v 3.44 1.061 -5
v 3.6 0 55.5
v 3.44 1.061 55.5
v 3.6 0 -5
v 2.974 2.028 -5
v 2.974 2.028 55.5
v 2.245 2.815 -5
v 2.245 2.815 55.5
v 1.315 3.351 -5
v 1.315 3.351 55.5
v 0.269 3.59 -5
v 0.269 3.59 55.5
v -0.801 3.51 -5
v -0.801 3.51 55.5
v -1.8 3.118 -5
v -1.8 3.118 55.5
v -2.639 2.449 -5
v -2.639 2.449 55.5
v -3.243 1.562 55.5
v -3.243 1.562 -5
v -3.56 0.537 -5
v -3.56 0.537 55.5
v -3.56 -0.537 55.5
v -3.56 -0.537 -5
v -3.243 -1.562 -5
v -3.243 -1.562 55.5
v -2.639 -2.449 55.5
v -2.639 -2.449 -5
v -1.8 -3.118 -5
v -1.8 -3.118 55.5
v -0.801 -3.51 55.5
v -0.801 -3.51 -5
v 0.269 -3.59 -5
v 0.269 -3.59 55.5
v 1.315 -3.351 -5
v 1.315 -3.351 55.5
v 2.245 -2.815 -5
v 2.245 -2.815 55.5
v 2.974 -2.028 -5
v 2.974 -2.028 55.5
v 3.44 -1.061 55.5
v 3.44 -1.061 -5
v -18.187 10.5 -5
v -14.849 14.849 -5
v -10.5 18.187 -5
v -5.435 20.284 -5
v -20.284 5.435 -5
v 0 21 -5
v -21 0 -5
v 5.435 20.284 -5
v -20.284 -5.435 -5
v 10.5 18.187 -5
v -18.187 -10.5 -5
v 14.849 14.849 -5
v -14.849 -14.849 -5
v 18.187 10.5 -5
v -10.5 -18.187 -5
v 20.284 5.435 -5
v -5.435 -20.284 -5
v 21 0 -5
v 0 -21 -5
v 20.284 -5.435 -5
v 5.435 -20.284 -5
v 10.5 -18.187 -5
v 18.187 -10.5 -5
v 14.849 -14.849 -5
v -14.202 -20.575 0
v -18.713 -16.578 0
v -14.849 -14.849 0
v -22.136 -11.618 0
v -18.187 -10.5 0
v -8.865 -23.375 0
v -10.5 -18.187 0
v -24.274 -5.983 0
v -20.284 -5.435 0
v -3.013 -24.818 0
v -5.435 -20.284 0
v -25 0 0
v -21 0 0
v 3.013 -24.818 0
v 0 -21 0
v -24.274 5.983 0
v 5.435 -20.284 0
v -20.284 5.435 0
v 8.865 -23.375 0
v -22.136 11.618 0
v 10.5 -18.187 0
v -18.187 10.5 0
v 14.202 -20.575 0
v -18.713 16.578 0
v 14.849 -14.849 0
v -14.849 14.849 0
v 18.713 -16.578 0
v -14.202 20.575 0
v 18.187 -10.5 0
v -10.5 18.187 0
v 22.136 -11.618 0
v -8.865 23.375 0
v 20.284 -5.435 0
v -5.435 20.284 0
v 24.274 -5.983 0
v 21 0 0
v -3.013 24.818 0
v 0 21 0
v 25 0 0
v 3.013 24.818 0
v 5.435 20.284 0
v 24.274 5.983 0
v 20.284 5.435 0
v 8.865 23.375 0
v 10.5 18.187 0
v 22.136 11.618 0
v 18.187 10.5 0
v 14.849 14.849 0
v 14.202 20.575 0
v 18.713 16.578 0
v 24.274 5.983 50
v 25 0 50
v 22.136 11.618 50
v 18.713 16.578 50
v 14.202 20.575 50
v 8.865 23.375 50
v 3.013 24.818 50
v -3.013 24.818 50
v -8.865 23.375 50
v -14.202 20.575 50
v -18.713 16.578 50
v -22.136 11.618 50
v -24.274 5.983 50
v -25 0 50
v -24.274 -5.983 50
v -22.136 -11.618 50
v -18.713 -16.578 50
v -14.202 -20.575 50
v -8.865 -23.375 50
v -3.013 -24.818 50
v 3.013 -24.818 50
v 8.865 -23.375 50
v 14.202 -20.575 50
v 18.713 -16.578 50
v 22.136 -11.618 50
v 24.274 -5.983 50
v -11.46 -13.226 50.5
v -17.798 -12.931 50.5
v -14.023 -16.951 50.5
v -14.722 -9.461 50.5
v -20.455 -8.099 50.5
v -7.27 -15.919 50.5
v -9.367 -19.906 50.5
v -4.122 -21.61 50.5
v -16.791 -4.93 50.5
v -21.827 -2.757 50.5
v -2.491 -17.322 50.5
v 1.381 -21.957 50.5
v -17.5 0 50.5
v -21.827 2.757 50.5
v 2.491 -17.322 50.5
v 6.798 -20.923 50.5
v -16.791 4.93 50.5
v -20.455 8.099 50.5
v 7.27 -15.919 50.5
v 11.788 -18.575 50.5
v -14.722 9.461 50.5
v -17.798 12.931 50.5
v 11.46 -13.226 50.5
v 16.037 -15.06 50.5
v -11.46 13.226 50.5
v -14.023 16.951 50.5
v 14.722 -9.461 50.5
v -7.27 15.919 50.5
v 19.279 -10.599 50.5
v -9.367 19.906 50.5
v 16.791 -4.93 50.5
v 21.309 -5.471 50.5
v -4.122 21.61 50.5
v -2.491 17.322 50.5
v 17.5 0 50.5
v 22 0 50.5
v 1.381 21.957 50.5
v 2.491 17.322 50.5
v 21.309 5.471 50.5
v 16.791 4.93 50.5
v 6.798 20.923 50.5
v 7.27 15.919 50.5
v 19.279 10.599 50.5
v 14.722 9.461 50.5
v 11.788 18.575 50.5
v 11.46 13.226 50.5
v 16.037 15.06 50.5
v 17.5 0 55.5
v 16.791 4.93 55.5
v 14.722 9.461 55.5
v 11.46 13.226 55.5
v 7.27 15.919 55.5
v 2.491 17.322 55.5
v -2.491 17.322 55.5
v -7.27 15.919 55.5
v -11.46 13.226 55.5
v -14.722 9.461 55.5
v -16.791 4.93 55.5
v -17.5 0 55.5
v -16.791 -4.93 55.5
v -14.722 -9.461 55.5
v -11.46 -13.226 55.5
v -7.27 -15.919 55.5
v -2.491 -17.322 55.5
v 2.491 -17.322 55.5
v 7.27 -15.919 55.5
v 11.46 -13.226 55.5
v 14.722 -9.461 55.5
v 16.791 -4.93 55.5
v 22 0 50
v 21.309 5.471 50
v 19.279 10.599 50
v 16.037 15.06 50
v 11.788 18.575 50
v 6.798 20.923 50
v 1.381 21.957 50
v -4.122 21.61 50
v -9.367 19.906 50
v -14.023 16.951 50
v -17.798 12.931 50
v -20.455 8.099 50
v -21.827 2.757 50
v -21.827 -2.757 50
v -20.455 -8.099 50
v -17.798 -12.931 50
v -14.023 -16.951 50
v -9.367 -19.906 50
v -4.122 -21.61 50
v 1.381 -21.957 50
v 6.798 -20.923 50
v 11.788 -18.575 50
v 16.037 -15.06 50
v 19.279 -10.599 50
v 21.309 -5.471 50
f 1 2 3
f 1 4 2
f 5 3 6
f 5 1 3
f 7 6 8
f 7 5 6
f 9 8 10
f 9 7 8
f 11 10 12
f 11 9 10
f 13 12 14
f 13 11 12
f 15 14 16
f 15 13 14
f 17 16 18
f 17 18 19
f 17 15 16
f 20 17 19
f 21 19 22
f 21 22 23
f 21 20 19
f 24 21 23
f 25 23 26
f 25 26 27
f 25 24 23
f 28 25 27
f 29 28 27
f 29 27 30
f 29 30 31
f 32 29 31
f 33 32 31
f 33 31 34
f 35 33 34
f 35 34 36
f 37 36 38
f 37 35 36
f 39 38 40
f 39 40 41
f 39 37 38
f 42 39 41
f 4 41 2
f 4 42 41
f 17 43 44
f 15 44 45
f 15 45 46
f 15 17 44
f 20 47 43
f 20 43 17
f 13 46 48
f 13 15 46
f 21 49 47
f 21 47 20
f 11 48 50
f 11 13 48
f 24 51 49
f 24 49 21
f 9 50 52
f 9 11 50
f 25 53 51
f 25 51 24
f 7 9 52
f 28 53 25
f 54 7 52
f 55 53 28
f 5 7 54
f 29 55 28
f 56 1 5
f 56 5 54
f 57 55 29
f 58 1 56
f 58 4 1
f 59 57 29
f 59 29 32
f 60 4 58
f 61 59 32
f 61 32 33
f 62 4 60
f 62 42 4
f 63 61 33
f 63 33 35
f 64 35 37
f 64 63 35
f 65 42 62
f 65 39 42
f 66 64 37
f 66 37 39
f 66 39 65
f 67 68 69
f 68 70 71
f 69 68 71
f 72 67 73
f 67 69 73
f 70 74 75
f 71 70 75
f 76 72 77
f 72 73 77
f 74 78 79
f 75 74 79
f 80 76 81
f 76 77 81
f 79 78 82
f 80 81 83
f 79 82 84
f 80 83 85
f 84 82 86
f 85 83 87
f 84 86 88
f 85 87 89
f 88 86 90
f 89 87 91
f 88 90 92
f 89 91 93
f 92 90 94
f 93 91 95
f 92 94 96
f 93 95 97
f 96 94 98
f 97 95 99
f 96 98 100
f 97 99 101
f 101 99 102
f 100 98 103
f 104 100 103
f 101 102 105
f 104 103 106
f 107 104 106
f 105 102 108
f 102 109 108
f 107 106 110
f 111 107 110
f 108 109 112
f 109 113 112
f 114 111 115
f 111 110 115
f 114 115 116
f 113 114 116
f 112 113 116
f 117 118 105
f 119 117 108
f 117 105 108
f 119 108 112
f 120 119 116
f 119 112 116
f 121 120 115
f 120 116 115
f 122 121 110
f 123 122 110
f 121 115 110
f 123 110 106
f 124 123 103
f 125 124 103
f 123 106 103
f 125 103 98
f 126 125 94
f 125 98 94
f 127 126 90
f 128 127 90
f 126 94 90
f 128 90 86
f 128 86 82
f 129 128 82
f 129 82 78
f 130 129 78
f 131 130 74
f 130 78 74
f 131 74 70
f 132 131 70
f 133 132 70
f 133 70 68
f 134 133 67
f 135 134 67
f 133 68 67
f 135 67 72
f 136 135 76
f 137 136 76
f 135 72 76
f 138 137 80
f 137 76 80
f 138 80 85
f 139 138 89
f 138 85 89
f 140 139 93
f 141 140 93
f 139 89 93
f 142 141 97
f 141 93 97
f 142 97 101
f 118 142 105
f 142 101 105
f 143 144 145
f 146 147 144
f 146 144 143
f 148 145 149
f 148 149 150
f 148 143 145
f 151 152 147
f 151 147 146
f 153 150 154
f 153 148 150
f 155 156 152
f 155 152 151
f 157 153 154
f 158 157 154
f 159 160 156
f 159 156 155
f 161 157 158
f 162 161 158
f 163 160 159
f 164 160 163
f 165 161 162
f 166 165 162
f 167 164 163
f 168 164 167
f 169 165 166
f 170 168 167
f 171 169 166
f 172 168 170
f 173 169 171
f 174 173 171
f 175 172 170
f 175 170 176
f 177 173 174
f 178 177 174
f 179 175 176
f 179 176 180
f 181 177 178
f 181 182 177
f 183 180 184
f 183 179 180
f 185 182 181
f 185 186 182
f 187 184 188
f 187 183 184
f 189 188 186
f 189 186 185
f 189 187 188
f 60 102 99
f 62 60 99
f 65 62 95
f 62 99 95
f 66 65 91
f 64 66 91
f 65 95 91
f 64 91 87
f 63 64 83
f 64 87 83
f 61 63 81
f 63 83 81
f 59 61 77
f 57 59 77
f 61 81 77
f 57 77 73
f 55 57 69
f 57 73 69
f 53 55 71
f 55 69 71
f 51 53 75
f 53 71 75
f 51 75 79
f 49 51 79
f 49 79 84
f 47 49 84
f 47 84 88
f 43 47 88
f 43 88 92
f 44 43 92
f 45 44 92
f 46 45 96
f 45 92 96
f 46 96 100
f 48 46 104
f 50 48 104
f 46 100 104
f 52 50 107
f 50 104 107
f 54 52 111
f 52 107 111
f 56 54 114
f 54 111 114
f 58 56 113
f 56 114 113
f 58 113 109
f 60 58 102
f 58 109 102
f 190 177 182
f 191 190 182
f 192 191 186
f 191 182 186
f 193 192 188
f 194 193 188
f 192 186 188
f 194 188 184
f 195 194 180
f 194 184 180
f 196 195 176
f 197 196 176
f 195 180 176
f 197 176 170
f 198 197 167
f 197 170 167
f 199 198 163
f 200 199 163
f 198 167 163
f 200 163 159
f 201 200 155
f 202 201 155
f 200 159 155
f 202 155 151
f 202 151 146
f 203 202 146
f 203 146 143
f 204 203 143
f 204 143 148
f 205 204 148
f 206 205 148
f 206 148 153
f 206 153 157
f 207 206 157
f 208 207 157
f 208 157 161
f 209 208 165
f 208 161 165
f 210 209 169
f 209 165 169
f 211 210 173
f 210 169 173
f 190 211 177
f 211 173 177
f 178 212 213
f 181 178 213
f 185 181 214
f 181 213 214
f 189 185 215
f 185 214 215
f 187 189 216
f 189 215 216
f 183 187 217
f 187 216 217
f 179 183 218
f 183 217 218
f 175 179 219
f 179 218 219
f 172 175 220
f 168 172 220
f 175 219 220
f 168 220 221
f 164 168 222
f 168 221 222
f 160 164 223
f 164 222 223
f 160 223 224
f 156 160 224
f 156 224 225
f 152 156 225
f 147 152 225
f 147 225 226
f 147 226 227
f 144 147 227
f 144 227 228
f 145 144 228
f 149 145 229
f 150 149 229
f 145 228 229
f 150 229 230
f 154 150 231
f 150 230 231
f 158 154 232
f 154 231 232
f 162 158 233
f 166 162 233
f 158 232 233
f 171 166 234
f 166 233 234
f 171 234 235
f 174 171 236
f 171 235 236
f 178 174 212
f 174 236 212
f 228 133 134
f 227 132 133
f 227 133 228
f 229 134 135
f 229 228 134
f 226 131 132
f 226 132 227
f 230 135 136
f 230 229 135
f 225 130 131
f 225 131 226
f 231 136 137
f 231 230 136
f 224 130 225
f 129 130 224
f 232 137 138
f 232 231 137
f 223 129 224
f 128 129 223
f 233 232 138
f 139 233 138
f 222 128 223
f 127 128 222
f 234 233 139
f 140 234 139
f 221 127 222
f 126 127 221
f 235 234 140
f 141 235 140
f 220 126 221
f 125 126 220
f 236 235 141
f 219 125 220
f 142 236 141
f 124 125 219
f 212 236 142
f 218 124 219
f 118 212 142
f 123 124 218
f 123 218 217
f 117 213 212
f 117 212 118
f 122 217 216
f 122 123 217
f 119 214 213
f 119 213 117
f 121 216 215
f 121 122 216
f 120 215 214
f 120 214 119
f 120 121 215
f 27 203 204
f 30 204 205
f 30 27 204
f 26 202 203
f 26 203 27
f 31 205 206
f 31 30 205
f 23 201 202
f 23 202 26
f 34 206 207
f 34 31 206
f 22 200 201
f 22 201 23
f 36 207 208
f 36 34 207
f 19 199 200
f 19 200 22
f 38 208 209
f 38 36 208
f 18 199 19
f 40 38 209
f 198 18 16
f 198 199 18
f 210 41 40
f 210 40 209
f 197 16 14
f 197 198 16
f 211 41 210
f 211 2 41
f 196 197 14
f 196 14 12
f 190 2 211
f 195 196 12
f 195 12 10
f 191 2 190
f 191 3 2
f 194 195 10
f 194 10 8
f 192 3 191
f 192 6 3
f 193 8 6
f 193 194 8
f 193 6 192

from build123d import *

# Parameters (mm, degrees)
F0_R     = 25
F0_R_2   = 3.6
F1_DEPTH = 50
F2_R     = 21
F2_R_2   = 3.6
F3_DEPTH = 5
F4_R     = 22
F4_R_2   = 3.6
F5_DEPTH = 0.5
F6_R     = 17.5
F6_R_2   = 3.6
F7_DEPTH = 5


with BuildPart() as f1:
    # F0 (on Top) → F1 (new body)
    with BuildSketch(Plane.XY):
        Circle(F0_R)
        Circle(F0_R_2, mode=Mode.SUBTRACT)
    extrude(amount=F1_DEPTH)

    # F2 (on face) → F3 (join)
    with BuildSketch(Plane(origin=(0, 0, 0), x_dir=(1, 0, 0), z_dir=(0, 0, -1))):
        Circle(F2_R)
        Circle(F2_R_2, mode=Mode.SUBTRACT)
    extrude(amount=F3_DEPTH)

    # F4 (on face) → F5 (join)
    with BuildSketch(Plane.XY.offset(50)):
        Circle(F4_R)
        Circle(F4_R_2, mode=Mode.SUBTRACT)
    extrude(amount=F5_DEPTH)

    # F6 (on face) → F7 (join)
    with BuildSketch(Plane.XY.offset(50.5)):
        Circle(F6_R)
        Circle(F6_R_2, mode=Mode.SUBTRACT)
    extrude(amount=F7_DEPTH)


solid = f1.part
